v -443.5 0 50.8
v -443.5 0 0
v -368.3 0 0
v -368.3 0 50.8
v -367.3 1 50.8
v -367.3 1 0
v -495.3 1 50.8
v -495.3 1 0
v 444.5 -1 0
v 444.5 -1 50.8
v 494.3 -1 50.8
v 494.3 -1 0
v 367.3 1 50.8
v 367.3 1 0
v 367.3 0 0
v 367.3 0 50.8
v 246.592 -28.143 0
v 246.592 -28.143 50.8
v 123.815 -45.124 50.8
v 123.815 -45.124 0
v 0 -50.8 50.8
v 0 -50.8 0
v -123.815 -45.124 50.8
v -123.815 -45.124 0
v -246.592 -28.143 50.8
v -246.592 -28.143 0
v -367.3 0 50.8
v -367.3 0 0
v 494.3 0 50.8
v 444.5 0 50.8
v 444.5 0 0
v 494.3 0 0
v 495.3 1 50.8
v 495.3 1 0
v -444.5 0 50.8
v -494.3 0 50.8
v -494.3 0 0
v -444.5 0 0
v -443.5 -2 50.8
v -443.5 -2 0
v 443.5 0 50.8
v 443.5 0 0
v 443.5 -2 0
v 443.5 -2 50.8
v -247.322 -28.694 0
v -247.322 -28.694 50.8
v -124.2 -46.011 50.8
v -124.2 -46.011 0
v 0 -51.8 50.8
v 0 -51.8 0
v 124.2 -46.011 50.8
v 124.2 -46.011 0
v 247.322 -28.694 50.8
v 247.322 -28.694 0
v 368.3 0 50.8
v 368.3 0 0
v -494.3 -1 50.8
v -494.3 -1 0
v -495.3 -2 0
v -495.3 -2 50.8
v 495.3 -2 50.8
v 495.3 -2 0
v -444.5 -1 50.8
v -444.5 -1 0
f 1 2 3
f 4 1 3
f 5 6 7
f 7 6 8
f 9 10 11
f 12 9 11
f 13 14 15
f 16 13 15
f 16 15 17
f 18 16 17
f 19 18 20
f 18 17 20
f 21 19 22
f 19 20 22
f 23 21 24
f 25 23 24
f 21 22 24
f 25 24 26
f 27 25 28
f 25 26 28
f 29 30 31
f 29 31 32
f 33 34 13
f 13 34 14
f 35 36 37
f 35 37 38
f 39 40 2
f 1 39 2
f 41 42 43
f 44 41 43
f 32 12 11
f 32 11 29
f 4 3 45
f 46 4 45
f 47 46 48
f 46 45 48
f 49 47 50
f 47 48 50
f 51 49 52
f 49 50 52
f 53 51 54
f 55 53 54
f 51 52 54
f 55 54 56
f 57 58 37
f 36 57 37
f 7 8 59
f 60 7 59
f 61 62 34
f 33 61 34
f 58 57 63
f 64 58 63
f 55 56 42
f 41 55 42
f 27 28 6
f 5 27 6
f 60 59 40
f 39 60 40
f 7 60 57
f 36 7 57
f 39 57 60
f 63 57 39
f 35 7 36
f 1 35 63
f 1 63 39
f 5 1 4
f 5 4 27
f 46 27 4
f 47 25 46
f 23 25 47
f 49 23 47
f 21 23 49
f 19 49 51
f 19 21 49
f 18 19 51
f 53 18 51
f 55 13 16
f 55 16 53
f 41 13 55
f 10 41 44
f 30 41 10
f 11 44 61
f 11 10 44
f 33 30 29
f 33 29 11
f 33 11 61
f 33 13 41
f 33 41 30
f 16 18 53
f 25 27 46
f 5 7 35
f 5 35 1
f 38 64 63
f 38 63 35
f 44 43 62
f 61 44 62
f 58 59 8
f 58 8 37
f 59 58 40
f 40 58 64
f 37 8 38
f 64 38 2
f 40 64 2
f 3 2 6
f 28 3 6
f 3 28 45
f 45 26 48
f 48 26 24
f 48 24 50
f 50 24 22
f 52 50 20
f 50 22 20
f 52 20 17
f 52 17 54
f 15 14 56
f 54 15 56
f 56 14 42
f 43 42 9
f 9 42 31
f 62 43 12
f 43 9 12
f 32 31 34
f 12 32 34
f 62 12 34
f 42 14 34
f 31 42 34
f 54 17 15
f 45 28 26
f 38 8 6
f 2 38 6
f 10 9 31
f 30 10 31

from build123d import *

# Parameters (mm, degrees)
SKETCH1_W           = 49.8
SKETCH1_H           = 1
BOSS_EXTRUDE1_DEPTH = 50.8


with BuildPart() as part:
    # Sketch1 → Boss-Extrude1 (new body)
    with BuildSketch(Plane.XY):
        with BuildLine():
            Line((-444.5, 1), (-495.3, 1))
            Line((-495.3, 1), (-495.3, -2))
            Line((-495.3, -2), (-444.5, -2))
            Line((-444.5, -2), (-443.5, -2))
            Line((-443.5, -2), (-443.5, 0))
            Line((-443.5, 0), (-368.3, 0))
            ThreePointArc((-368.3, 0), (0, -51.8), (368.3, 0))
            Line((368.3, 0), (443.5, 0))
            Line((443.5, 0), (443.5, -2))
            Line((443.5, -2), (444.5, -2))
            Line((444.5, -2), (495.3, -2))
            Line((495.3, -2), (495.3, 1))
            Line((495.3, 1), (444.5, 1))
            Line((444.5, 1), (368.3, 1))
            Line((368.3, 1), (367.3, 1))
            Line((367.3, 1), (367.3, 0))
            ThreePointArc((367.3, 0), (0, -50.8), (-367.3, 0))
            Line((-367.3, 0), (-367.3, 1))
            Line((-367.3, 1), (-368.3, 1))
            Line((-368.3, 1), (-444.5, 1))
        make_face()
        with Locations((-469.4, -0.5)):
            Rectangle(SKETCH1_W, SKETCH1_H, mode=Mode.SUBTRACT)
        with Locations((469.4, -0.5)):
            Rectangle(SKETCH1_W, SKETCH1_H, mode=Mode.SUBTRACT)
    extrude(amount=BOSS_EXTRUDE1_DEPTH)


solid = part.part
